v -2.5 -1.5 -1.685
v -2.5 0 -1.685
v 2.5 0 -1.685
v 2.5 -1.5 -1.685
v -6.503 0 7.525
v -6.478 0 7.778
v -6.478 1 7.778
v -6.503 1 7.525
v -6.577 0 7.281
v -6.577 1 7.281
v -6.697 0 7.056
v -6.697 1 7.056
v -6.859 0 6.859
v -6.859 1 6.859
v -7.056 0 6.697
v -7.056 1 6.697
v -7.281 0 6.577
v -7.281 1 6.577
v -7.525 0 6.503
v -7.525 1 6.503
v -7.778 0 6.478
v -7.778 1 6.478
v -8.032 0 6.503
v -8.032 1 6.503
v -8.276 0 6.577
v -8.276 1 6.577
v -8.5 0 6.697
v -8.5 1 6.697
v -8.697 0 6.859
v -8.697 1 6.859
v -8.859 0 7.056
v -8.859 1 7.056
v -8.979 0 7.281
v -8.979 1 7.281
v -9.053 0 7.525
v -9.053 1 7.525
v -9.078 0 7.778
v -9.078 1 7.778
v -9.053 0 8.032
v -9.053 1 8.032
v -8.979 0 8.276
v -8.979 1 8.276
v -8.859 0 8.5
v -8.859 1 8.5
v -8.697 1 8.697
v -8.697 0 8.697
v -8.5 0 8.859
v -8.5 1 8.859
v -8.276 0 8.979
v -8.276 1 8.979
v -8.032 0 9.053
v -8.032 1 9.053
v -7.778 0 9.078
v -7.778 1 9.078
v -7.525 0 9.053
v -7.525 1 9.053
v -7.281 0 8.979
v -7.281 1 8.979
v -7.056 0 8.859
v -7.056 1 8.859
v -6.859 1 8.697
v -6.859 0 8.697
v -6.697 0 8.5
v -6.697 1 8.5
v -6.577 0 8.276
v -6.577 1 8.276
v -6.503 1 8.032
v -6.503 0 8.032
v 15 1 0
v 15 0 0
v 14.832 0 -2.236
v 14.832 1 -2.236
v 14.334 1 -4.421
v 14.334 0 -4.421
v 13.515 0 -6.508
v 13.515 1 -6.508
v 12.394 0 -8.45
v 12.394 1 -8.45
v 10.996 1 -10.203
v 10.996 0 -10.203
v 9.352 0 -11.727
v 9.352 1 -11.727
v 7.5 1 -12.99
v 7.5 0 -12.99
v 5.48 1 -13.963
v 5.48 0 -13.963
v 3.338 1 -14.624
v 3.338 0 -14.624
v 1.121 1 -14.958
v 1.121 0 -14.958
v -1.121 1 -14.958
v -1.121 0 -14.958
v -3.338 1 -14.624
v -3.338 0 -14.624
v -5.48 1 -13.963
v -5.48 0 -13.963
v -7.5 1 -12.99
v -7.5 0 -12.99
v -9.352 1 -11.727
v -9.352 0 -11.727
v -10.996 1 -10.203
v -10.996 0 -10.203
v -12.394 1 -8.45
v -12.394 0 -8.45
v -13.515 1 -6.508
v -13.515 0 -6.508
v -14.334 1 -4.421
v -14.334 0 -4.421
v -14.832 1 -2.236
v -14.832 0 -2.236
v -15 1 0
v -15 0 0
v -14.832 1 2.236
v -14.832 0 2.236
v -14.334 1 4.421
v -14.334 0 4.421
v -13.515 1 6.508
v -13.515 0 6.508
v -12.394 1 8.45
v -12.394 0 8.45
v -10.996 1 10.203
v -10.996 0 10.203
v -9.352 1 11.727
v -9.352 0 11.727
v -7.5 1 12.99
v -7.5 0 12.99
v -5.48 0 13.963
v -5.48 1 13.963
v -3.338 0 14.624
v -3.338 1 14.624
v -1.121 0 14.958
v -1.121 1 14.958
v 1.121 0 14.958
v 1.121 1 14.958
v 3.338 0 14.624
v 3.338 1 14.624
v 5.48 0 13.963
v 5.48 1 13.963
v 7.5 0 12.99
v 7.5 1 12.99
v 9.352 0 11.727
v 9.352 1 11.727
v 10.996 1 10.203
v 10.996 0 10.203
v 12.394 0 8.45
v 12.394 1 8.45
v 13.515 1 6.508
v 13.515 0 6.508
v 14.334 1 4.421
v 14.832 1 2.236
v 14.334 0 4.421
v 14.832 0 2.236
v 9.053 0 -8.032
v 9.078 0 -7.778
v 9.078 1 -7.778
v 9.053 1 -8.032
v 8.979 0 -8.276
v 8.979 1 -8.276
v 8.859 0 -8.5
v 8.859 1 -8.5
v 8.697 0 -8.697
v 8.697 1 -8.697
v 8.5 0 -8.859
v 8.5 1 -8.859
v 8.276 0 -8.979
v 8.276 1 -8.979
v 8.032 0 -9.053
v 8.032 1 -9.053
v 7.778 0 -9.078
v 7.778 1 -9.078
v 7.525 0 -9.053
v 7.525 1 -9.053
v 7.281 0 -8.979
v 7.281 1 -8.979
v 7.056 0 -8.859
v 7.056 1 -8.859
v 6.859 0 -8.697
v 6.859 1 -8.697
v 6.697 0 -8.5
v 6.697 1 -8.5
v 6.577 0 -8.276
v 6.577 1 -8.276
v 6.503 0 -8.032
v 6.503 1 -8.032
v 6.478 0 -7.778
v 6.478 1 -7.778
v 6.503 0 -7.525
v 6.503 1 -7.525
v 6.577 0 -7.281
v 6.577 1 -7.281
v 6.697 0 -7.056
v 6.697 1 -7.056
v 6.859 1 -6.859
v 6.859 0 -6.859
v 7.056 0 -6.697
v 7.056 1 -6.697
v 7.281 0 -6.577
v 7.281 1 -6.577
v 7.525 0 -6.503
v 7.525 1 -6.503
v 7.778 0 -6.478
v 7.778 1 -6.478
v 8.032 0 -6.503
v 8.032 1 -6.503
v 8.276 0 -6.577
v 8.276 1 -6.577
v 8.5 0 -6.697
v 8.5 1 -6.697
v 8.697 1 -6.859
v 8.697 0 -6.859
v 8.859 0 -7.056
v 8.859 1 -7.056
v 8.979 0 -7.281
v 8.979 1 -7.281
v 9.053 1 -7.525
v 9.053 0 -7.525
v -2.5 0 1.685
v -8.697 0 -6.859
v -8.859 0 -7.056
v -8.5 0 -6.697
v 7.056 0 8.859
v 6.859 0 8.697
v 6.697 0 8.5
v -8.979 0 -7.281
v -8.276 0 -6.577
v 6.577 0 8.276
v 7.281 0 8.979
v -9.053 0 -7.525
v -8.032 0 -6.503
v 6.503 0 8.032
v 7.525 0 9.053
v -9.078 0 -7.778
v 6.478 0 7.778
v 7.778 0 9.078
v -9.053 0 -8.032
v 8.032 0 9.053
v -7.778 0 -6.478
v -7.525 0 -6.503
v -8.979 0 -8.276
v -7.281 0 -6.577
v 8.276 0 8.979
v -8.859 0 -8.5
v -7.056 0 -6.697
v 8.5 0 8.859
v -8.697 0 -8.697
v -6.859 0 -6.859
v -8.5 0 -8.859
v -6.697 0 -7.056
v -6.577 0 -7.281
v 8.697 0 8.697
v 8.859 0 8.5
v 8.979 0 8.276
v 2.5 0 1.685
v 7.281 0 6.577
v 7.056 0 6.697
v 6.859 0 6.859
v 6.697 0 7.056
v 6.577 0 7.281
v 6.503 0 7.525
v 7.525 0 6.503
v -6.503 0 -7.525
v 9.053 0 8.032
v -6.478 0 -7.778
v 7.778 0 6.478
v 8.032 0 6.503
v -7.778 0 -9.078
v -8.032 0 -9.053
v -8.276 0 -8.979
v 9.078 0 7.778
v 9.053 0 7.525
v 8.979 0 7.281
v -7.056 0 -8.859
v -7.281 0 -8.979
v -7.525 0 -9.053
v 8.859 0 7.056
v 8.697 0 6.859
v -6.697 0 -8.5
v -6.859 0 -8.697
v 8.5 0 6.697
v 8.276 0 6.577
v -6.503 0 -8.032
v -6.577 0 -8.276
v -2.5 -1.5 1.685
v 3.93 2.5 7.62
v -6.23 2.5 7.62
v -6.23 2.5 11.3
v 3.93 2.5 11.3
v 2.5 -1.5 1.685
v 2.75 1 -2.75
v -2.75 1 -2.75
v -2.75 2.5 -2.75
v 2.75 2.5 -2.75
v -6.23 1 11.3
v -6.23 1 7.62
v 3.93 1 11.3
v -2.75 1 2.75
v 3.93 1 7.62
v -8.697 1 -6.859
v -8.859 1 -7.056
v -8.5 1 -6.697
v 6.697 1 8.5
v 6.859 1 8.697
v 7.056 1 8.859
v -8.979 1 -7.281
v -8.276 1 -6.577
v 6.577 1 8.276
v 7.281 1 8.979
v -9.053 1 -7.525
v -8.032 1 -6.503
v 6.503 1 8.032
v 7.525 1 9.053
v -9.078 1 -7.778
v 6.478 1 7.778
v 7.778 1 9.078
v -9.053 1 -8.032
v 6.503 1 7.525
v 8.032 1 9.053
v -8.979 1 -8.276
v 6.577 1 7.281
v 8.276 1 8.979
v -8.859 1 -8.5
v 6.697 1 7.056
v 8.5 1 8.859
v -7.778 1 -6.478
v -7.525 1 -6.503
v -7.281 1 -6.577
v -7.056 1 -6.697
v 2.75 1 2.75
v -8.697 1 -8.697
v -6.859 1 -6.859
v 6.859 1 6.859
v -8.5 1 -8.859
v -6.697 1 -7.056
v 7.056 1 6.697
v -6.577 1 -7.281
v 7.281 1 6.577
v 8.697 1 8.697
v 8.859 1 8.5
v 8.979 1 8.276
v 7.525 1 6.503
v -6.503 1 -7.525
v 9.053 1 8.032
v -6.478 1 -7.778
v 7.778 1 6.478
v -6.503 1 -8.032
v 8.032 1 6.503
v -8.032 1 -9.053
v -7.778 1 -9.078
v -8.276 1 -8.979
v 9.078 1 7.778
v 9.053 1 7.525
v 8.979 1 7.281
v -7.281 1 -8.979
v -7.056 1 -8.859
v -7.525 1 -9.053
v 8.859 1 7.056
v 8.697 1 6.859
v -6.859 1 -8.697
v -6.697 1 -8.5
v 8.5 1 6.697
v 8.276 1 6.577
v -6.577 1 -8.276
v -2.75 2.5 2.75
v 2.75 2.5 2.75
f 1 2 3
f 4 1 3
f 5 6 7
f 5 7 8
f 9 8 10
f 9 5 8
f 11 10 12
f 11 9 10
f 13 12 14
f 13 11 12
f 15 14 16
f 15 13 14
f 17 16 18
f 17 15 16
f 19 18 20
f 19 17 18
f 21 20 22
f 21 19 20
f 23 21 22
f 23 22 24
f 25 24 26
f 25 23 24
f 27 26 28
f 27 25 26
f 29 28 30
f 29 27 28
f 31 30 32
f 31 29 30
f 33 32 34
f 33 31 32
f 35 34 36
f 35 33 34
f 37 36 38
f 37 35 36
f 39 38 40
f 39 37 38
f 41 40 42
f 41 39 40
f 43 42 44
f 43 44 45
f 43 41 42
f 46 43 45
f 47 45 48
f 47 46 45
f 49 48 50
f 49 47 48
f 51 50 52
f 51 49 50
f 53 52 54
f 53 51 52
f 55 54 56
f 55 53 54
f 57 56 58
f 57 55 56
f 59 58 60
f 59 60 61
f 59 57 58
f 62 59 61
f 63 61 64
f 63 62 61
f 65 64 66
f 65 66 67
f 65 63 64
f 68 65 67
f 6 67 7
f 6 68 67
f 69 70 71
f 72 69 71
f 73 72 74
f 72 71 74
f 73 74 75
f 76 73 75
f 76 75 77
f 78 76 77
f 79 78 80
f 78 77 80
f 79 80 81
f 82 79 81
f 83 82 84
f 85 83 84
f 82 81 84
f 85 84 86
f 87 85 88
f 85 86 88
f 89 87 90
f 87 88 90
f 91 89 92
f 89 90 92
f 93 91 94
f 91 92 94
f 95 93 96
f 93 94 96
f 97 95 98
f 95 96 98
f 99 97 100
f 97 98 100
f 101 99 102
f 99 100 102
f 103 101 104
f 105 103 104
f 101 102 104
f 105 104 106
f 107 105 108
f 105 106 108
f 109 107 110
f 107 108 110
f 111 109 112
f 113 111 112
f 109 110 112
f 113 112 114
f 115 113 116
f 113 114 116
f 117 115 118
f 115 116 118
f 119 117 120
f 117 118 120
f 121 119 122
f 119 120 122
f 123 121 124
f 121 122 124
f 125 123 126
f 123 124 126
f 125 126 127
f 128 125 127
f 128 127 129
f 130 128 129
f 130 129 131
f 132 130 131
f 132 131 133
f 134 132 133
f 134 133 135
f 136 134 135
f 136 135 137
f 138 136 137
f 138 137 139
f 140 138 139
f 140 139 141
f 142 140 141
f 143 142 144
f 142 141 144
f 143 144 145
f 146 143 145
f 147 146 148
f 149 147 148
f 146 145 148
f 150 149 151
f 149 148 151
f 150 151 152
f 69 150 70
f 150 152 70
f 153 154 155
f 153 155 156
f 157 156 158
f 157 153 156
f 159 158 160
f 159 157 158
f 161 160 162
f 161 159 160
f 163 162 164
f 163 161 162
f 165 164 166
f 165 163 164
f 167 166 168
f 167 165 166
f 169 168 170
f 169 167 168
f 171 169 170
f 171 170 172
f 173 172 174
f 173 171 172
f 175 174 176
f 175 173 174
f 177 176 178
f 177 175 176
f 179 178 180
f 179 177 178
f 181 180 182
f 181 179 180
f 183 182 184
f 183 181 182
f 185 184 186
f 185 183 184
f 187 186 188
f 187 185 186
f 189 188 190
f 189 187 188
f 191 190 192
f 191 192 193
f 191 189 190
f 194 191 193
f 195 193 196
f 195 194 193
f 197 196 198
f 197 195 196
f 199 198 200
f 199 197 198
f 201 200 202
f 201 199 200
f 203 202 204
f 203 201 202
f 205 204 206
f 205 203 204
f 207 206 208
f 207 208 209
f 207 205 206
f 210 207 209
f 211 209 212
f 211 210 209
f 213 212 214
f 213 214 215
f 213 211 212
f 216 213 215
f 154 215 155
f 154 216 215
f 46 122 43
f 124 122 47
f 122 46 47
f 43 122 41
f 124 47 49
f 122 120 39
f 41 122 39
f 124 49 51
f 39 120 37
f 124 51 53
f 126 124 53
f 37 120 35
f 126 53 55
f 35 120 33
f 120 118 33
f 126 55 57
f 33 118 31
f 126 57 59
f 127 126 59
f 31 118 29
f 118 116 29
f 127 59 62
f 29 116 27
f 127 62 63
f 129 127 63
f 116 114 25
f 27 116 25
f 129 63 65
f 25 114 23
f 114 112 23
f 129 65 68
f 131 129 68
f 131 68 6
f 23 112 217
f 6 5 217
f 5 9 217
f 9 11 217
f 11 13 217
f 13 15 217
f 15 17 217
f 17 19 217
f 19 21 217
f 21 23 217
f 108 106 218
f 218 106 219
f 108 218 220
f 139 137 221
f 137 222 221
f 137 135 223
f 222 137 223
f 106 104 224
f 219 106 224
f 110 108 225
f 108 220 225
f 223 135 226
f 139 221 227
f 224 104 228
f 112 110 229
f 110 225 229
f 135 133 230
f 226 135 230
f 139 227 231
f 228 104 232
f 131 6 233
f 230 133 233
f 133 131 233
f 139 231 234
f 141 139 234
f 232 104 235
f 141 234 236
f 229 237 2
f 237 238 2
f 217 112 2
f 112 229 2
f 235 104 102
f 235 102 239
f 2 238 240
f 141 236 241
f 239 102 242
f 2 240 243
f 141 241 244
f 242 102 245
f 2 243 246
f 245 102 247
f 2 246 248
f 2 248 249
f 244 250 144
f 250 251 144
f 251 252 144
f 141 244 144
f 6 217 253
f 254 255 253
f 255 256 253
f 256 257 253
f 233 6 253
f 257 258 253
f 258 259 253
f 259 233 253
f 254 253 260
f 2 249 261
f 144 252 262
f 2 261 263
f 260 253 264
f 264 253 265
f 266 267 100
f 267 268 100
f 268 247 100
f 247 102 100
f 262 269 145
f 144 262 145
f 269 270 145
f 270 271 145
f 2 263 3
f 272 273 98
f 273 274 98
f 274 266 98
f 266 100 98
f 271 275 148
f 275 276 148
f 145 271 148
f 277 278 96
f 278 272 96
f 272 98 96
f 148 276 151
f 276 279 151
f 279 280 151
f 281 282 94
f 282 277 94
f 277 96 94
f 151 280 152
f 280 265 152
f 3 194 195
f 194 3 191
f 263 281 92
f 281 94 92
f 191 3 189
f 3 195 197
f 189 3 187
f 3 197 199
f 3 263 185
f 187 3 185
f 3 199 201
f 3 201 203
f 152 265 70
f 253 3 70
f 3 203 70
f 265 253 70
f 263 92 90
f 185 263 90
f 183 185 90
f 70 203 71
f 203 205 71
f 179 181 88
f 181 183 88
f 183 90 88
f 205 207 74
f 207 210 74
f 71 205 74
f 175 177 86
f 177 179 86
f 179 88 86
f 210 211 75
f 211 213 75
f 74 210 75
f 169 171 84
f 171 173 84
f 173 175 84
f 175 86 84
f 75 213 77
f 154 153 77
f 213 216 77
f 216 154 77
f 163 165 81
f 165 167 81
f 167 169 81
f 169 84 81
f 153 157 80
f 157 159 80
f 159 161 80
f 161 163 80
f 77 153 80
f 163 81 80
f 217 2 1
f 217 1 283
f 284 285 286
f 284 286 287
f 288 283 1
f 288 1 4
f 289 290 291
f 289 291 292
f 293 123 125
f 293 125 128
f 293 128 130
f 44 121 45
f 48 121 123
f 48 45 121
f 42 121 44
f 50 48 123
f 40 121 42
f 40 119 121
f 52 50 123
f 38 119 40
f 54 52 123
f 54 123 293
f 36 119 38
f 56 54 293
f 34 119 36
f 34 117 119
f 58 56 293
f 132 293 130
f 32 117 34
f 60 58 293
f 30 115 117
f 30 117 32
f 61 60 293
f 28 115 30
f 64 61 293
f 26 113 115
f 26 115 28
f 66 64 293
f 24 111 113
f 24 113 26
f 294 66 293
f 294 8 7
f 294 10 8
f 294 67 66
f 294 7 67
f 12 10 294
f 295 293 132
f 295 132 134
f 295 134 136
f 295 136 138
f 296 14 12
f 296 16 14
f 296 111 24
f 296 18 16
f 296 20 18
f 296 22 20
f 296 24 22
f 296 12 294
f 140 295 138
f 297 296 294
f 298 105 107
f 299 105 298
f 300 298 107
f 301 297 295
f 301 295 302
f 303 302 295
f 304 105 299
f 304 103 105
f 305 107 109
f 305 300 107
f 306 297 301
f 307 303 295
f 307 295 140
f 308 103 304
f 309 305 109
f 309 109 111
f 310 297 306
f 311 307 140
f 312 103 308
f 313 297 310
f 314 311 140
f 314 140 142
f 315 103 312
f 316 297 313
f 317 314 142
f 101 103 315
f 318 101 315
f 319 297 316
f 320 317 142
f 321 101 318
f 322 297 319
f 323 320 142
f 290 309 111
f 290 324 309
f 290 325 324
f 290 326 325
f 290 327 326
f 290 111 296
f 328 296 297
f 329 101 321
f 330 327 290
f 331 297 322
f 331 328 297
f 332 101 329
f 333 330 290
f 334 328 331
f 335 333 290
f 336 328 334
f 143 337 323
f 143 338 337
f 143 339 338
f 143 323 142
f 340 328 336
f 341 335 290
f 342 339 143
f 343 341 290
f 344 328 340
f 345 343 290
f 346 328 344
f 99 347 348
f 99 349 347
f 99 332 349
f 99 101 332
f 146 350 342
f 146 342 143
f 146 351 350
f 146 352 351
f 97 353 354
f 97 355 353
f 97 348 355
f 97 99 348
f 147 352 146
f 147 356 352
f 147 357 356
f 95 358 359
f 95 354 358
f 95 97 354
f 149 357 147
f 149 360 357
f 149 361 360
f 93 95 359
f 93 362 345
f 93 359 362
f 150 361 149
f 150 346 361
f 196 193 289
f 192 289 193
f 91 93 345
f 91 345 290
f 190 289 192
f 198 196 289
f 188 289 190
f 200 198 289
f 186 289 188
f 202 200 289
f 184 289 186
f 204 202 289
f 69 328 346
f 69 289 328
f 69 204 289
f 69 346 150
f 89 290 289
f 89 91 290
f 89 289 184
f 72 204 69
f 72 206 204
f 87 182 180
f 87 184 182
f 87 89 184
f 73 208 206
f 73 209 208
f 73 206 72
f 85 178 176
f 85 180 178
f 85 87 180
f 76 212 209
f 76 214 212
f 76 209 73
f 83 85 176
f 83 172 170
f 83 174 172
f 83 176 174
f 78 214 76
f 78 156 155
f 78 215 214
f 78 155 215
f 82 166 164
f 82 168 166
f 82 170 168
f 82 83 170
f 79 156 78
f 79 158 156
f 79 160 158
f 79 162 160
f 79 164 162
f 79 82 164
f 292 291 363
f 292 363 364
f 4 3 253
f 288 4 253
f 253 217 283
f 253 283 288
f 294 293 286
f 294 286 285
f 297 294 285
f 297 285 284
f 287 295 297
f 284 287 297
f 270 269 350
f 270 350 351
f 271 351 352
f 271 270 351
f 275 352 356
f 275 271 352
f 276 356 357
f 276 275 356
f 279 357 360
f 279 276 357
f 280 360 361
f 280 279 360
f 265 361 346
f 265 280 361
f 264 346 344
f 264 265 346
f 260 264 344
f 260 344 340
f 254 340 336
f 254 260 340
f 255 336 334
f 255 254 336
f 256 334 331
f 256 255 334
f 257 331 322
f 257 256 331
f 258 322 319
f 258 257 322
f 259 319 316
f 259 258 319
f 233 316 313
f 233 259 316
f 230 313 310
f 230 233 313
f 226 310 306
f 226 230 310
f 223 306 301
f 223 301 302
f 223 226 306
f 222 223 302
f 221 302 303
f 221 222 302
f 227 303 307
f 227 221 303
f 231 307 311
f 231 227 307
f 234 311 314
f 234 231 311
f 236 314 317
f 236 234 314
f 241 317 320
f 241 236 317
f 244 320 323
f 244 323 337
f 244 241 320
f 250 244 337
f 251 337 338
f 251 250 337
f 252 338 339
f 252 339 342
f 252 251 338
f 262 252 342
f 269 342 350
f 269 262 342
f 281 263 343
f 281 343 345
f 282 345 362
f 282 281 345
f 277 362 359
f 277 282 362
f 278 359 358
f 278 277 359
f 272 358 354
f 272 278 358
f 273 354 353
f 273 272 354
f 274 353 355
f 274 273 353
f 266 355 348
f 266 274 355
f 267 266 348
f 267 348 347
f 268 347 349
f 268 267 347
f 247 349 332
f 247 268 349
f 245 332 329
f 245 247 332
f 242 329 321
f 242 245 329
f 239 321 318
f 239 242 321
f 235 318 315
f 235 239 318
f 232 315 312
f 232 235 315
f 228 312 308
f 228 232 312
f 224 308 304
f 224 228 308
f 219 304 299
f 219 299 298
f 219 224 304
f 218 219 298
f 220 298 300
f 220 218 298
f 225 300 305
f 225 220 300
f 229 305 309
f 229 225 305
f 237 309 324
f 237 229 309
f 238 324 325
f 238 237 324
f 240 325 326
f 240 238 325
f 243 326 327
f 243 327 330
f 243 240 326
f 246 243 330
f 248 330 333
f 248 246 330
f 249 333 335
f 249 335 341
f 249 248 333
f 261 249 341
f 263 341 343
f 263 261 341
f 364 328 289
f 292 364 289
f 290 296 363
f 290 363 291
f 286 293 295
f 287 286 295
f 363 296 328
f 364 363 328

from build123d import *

# Parameters (mm, degrees)
SKETCH_1_R      = 15
SKETCH_1_R_2    = 1.3
EXTRUDE_2_DEPTH = 1
SKETCH_2_W      = 5.5
SKETCH_2_H      = 5.5
SKETCH_2_W_2    = 10.16
SKETCH_2_H_2    = 3.68
EXTRUDE_5_DEPTH = 1.5
SKETCH_3_W      = 5
SKETCH_3_H      = 3.37
EXTRUDE_7_DEPTH = 1.5


with BuildPart() as part:
    # 草图1 → 凸台-拉伸2 (new body)
    with BuildSketch(Plane(origin=(0, 0, 0), x_dir=(1, 0, 0), z_dir=(0, 1, 0))):
        Circle(SKETCH_1_R)
        with Locations((-7.778174593, 7.778174593)):
            Circle(SKETCH_1_R_2, mode=Mode.SUBTRACT)
        with Locations((7.778174593, 7.778174593)):
            Circle(SKETCH_1_R_2, mode=Mode.SUBTRACT)
        with Locations((7.778174593, -7.778174593)):
            Circle(SKETCH_1_R_2, mode=Mode.SUBTRACT)
        with Locations((-7.778174593, -7.778174593)):
            Circle(SKETCH_1_R_2, mode=Mode.SUBTRACT)
    extrude(amount=EXTRUDE_2_DEPTH)

    # 草图2 → 凸台-拉伸5 (add)
    with BuildSketch(Plane(origin=(0, 1, 0), x_dir=(1, 0, 0), z_dir=(0, 1, 0))):
        Rectangle(SKETCH_2_W, SKETCH_2_H)
        with Locations((-1.15, -9.46)):
            Rectangle(SKETCH_2_W_2, SKETCH_2_H_2)
    extrude(amount=EXTRUDE_5_DEPTH)

    # 草图3 → 凸台-拉伸7 (add)
    with BuildSketch(Plane.XZ):
        Rectangle(SKETCH_3_W, SKETCH_3_H)
    extrude(amount=EXTRUDE_7_DEPTH)


solid = part.part
